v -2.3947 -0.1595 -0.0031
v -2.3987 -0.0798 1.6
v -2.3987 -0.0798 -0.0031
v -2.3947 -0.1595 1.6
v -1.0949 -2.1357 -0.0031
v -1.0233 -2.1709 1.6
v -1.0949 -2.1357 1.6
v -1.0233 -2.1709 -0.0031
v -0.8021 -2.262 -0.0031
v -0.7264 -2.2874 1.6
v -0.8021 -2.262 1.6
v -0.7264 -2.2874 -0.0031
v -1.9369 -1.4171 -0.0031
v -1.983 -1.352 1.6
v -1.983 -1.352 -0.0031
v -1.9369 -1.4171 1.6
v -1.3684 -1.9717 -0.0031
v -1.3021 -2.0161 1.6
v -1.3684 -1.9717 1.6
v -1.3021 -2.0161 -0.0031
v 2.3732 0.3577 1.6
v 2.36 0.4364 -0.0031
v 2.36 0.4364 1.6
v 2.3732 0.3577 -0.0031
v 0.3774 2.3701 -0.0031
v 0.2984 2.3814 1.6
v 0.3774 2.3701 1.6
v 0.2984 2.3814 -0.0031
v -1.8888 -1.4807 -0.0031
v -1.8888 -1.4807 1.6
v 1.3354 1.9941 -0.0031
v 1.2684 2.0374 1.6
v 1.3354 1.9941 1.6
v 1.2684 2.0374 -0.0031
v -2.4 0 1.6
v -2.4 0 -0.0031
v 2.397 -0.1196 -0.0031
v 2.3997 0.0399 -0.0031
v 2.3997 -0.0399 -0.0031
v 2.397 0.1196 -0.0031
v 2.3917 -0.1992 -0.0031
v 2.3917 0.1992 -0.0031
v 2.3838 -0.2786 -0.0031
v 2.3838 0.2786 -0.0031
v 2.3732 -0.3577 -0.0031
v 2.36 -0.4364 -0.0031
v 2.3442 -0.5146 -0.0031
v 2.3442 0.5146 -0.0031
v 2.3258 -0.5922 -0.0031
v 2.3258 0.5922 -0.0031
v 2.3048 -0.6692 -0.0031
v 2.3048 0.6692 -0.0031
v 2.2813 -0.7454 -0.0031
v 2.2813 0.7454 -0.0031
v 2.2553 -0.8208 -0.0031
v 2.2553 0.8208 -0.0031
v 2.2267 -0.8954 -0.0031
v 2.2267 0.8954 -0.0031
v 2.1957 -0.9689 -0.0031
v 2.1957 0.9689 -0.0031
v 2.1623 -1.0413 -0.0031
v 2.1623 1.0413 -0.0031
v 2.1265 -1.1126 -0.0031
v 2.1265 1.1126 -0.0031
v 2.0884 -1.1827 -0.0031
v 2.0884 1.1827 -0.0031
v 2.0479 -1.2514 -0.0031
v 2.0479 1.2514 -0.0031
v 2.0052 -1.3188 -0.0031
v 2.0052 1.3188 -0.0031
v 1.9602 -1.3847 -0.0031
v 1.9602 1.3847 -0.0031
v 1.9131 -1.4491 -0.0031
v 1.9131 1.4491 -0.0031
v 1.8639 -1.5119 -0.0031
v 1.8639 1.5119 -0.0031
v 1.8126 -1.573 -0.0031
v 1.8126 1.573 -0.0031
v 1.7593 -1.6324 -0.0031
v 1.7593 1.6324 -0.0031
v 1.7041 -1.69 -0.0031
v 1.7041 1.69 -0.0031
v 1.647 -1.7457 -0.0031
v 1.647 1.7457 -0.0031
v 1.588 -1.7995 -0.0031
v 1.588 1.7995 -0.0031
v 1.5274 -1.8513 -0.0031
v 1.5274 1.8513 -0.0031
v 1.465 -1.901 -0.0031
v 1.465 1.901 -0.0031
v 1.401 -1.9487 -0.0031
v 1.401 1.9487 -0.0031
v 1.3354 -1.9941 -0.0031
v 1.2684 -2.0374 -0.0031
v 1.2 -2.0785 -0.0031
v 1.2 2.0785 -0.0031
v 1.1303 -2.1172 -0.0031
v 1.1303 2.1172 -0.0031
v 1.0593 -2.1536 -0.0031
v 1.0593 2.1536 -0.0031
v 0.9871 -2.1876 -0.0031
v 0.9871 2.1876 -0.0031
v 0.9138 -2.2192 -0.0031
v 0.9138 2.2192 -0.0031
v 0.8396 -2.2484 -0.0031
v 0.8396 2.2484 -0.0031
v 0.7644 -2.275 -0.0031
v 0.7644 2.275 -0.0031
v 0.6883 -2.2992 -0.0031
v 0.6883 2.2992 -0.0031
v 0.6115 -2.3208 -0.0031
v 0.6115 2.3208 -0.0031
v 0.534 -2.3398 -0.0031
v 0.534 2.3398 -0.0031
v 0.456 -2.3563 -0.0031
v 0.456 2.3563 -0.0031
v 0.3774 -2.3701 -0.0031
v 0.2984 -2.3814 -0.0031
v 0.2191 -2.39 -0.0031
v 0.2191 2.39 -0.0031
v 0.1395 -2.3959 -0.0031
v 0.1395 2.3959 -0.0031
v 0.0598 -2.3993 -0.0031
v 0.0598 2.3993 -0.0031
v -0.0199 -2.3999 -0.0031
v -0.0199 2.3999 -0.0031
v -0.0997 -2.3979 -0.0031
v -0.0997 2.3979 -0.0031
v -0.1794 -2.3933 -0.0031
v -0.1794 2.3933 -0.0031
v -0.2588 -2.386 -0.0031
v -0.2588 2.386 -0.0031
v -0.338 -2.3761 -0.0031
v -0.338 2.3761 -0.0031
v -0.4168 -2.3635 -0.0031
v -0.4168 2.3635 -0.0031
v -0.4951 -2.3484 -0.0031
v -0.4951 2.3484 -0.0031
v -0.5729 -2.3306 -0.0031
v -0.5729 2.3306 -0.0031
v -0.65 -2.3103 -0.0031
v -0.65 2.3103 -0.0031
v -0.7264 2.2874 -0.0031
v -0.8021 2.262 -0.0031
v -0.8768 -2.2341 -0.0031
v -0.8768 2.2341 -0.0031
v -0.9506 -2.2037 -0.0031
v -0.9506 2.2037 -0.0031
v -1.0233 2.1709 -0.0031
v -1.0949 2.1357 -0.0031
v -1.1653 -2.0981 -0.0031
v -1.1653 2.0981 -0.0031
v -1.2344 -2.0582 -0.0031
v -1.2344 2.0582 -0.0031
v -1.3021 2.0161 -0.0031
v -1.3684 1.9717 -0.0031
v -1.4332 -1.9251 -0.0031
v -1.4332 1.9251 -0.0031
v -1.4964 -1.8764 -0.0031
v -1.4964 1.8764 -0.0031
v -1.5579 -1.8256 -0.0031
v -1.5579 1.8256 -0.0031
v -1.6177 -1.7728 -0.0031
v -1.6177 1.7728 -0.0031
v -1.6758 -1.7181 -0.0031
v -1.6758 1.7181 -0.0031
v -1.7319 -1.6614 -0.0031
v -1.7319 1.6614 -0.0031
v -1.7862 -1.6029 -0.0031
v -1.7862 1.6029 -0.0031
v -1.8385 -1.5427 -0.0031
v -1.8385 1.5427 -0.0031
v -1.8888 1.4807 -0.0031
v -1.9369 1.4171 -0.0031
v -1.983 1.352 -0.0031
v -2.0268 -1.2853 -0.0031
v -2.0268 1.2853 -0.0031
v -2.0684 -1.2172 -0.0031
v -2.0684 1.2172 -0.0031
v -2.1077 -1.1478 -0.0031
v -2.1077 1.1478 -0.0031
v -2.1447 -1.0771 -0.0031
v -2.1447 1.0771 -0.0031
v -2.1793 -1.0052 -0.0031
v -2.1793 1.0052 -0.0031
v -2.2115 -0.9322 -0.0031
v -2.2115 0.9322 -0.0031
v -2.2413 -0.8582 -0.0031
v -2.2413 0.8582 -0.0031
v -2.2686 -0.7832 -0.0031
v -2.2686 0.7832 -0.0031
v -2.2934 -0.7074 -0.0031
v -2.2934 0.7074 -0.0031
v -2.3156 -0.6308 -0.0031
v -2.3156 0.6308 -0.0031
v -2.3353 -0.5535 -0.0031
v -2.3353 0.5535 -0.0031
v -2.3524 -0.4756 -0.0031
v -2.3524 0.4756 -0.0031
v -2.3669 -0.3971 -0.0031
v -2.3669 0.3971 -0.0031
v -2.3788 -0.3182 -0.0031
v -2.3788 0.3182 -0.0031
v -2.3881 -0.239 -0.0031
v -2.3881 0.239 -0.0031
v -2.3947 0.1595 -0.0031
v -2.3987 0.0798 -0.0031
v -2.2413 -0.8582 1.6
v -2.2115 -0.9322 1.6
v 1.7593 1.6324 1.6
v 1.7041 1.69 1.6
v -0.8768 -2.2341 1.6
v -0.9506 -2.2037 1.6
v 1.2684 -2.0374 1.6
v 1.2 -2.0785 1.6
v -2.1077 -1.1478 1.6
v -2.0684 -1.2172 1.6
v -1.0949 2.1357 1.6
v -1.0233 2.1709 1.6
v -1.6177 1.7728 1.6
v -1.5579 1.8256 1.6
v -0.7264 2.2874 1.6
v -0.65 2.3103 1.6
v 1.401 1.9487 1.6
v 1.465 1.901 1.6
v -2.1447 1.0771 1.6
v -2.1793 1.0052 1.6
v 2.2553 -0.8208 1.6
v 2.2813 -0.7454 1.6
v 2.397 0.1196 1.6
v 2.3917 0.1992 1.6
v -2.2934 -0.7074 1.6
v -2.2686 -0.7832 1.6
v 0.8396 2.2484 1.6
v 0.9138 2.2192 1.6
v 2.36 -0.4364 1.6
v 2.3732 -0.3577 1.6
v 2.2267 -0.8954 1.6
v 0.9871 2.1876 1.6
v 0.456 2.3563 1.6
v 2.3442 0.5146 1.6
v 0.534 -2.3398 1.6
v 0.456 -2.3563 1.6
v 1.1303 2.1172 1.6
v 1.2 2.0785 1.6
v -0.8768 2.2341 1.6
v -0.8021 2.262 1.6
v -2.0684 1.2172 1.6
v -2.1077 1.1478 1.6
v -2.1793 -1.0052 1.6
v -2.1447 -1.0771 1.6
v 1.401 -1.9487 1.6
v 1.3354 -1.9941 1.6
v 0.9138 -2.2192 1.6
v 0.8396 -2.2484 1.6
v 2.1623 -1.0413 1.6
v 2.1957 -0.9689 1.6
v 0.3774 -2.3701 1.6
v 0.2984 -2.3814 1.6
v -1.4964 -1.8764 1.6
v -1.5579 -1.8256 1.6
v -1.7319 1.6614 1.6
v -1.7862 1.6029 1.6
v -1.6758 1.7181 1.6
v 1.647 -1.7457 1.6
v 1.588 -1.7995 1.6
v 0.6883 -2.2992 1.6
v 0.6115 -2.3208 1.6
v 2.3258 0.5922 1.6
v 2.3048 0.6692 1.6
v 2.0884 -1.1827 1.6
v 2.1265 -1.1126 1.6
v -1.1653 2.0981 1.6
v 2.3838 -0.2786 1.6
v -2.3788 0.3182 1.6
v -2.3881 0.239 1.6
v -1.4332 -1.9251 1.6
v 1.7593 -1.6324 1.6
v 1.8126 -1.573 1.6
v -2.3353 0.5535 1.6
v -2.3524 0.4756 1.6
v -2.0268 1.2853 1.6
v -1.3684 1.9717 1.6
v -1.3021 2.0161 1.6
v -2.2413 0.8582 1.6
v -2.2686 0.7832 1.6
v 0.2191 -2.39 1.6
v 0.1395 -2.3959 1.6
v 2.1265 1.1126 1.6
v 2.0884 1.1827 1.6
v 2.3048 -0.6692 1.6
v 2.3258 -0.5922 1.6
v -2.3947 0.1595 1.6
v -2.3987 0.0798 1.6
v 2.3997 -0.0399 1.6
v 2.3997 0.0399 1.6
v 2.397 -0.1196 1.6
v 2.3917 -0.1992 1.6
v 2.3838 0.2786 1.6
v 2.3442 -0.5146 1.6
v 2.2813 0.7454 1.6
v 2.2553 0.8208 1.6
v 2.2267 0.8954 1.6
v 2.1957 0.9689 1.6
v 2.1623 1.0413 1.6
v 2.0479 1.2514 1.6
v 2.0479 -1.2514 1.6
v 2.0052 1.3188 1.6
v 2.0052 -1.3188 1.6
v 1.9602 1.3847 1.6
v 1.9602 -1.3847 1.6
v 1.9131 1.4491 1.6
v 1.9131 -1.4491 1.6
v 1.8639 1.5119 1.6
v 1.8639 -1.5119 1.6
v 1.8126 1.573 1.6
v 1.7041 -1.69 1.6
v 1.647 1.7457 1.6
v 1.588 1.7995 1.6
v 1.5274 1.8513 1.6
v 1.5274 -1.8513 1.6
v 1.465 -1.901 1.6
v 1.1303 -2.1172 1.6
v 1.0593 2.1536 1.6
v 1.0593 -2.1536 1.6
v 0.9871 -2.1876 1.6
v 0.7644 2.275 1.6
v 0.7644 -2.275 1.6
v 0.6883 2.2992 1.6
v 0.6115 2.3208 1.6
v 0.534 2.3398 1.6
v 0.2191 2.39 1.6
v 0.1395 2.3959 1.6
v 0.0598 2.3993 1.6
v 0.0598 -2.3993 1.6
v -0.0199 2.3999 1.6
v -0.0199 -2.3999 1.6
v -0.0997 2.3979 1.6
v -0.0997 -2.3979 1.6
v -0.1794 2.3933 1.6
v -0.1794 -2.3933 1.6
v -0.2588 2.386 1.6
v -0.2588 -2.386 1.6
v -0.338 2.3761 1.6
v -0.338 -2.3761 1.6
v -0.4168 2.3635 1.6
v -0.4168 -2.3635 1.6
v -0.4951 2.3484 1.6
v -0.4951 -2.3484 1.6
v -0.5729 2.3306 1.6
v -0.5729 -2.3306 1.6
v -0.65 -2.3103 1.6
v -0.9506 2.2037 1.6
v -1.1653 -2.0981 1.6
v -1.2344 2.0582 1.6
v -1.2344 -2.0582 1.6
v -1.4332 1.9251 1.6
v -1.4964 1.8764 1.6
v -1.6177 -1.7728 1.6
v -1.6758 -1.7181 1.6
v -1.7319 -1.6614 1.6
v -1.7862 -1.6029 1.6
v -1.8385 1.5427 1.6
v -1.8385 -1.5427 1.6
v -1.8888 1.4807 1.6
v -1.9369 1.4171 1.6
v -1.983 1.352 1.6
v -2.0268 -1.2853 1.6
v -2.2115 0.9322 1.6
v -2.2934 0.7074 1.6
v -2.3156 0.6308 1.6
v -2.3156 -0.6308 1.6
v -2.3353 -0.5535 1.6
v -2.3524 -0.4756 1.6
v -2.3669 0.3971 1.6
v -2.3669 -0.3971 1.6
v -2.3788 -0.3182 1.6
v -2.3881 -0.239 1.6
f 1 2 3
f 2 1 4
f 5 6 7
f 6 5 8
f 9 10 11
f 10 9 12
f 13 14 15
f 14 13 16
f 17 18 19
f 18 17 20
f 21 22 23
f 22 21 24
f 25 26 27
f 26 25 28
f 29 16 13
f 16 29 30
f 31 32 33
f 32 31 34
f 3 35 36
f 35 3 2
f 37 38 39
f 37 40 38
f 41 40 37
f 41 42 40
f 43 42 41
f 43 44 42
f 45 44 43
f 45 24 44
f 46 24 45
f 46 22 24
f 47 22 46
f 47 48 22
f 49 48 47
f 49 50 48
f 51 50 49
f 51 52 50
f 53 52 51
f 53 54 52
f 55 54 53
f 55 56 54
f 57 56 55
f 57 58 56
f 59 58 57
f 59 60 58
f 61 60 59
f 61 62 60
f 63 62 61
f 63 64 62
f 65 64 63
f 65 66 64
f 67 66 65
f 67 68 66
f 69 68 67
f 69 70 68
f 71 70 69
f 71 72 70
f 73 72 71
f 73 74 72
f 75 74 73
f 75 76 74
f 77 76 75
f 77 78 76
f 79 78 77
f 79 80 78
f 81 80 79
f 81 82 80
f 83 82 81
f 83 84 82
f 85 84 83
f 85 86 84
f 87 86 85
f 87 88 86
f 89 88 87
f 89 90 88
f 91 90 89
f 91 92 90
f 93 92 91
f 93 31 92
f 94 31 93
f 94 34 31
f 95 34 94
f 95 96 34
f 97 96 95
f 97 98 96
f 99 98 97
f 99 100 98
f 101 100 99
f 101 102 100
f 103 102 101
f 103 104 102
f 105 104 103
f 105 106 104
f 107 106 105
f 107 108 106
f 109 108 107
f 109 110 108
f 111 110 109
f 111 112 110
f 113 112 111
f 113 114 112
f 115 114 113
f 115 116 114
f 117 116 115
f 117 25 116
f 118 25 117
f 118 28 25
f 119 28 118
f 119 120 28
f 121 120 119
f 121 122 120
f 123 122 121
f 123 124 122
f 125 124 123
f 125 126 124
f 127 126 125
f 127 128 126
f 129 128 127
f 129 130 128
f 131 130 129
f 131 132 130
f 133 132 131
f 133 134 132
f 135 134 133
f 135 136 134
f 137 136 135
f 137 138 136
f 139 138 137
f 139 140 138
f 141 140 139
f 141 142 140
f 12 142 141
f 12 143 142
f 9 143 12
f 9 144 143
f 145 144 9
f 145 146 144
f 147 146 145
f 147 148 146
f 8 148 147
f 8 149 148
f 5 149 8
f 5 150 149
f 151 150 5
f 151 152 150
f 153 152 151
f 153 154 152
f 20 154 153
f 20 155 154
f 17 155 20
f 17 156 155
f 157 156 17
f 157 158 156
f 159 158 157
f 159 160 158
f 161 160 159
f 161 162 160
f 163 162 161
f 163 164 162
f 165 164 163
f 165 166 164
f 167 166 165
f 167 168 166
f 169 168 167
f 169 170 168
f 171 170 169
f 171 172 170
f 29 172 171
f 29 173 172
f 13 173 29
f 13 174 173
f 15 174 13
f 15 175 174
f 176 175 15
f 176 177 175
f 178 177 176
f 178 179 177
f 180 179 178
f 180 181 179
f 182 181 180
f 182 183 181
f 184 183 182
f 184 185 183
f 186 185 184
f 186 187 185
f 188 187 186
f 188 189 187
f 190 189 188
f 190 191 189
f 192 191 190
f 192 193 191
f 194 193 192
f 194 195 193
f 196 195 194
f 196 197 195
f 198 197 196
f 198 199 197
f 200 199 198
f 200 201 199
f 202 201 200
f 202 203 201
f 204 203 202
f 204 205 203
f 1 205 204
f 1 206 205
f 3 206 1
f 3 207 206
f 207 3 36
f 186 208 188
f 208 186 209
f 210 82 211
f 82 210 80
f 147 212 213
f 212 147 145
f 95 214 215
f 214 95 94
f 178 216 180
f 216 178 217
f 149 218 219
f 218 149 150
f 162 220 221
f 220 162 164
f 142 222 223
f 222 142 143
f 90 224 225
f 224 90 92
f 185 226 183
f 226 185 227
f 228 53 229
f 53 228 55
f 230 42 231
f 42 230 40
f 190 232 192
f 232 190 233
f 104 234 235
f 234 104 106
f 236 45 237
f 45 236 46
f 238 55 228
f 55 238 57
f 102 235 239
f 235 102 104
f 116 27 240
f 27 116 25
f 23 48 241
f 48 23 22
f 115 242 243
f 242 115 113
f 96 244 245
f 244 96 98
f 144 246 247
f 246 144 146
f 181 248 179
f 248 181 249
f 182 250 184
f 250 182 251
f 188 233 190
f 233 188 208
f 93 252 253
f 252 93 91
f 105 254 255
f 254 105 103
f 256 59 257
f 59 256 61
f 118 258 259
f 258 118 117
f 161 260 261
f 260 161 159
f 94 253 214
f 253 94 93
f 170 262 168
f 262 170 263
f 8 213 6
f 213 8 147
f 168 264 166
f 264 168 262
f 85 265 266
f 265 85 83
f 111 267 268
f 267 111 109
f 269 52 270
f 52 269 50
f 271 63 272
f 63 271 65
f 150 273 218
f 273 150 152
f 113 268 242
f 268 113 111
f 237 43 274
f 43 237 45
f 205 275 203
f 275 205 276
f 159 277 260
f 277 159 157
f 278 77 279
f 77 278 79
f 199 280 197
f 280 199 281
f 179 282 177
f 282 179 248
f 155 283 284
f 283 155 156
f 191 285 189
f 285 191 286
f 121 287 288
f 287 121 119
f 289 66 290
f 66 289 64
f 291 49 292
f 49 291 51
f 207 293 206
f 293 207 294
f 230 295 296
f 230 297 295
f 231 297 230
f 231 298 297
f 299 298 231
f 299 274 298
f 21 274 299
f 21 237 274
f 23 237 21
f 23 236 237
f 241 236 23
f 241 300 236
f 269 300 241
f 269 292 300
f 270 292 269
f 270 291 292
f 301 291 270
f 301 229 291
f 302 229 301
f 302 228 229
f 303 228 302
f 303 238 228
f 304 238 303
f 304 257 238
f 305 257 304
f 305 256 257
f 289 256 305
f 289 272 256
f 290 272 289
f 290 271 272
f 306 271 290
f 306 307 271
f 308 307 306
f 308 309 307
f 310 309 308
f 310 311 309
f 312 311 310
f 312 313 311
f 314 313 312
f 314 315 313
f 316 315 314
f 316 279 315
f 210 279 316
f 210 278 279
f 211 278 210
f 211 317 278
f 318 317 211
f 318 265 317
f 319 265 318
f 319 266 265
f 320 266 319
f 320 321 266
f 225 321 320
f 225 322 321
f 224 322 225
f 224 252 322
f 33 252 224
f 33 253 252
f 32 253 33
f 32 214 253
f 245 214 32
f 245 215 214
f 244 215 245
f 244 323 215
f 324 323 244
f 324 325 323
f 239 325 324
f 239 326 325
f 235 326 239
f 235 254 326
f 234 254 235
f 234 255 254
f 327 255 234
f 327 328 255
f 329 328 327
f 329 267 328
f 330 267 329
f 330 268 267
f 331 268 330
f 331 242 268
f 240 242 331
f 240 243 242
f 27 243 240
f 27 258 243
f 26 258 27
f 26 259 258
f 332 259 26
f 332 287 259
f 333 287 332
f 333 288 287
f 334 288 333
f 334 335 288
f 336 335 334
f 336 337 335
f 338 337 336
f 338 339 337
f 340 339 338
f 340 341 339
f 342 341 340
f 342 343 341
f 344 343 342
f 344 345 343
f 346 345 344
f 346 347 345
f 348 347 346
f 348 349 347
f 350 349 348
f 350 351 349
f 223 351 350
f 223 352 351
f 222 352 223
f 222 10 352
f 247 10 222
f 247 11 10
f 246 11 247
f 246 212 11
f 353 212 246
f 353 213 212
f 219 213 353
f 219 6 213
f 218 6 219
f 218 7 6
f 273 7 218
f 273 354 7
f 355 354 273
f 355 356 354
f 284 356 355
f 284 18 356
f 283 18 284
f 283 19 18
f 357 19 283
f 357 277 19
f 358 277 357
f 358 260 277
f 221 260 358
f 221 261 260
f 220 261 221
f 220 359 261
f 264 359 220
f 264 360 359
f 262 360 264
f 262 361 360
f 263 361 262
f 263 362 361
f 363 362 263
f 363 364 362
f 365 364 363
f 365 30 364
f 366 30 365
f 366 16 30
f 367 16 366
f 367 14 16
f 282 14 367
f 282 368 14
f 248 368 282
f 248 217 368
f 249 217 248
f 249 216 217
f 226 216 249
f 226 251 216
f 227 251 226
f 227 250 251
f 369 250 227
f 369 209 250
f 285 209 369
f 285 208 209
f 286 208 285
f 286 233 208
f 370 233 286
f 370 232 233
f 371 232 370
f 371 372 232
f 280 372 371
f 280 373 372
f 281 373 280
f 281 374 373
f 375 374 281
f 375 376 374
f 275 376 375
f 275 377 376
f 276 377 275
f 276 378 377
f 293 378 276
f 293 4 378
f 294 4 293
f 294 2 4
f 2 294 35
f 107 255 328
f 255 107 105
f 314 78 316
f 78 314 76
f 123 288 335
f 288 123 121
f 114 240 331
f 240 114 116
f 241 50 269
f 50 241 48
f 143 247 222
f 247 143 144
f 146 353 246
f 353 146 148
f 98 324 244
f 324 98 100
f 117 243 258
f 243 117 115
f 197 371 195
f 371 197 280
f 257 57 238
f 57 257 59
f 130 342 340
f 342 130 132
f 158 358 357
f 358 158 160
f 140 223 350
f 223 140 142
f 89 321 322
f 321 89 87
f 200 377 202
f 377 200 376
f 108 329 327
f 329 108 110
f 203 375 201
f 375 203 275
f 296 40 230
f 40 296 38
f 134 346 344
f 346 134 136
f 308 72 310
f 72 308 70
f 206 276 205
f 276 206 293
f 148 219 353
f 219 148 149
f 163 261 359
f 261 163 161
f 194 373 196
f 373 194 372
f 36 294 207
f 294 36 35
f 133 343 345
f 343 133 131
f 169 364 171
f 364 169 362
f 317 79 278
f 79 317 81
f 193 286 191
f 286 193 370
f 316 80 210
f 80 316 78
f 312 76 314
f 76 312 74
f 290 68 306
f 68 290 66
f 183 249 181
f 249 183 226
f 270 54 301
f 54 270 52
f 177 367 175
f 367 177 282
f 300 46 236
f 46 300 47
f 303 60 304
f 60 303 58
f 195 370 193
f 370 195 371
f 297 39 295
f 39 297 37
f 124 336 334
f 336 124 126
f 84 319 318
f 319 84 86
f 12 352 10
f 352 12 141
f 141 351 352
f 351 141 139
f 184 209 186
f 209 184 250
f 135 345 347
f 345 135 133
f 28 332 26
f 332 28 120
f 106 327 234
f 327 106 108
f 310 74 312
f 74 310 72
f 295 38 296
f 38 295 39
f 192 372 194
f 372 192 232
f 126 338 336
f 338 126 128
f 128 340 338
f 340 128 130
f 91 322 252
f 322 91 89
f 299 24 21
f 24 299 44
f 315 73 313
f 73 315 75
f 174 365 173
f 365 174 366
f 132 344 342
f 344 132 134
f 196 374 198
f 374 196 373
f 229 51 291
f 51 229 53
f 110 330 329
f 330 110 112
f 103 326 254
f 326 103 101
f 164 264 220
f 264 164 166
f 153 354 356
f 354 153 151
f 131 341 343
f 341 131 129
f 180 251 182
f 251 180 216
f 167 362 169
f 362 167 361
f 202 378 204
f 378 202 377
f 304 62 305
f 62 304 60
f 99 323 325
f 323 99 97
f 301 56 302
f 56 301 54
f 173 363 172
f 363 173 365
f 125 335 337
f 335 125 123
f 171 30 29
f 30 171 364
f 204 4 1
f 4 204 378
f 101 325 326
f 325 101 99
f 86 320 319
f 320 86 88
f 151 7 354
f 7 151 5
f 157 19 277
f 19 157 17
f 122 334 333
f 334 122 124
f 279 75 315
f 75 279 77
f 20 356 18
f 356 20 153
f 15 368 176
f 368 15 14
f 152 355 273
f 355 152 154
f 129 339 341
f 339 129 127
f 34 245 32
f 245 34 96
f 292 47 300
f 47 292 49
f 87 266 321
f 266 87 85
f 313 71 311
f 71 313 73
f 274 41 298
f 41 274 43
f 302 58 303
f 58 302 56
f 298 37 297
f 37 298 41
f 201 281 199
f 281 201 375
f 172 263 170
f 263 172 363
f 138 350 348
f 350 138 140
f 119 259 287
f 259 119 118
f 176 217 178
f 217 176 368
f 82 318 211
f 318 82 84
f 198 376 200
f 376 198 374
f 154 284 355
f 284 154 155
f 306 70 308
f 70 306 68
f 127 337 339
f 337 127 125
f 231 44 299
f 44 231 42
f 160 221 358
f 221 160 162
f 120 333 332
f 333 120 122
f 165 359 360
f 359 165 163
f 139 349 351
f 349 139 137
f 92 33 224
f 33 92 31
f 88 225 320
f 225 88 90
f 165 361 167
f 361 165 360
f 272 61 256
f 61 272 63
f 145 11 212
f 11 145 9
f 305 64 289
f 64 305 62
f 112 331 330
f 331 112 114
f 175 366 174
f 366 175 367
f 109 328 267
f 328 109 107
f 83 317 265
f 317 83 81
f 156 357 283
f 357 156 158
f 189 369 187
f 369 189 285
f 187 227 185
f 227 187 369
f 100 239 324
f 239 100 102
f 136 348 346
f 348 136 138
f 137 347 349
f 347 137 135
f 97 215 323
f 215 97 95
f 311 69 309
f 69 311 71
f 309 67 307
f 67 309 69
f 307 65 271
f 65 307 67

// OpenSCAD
// file: ../p/stud3.scad
use <../lib.scad>
use <4-4cyli.scad>
use <4-4disc.scad>
use <4-4edge.scad>
$fa=1; $fs=0.2;
function ldraw_lib__stud3(realsolid=false) = realsolid ? 
    [openscad(translate([0,0,-eps()], o=cylinder(4+eps(), r=4)),2)] : [
// 0 Stud Tube Solid
// 0 Name: stud3.dat
// 0 Author: James Jessiman
// 0 !LDRAW_ORG Primitive UPDATE 2012-01
// 0 !LICENSE Licensed under CC BY 2.0 and CC BY 4.0 : see CAreadme.txt
// 
// 0 BFC CERTIFY CCW
  [0,"BFC","CERTIFY"],
  [0,"BFC","CCW"],
// 
// 0 !HISTORY 2002-04-04 [sbliss] Modified for BFC compliance
// 0 !HISTORY 2002-04-25 [PTadmin] Official Update 2002-02
// 0 !HISTORY 2007-06-24 [PTadmin] Header formatted for Contributor Agreement
// 0 !HISTORY 2008-07-01 [PTadmin] Official Update 2008-01
// 0 !HISTORY 2012-02-16 [Philo] Changed to CCW
// 0 !HISTORY 2012-03-30 [PTadmin] Official Update 2012-01
// 
// 
// 1 16 0 -4 0 4 0 0 0 1 0 0 0 4 4-4edge.dat
  [1,16,0,-4,0,4,0,0,0,1,0,0,0,4, ldraw_lib__4_4edge(realsolid)],
// 1 16 0 0 0 4 0 0 0 1 0 0 0 4 4-4edge.dat
  [1,16,0,0,0,4,0,0,0,1,0,0,0,4, ldraw_lib__4_4edge(realsolid)],
// 1 16 0 -4 0 4 0 0 0 1 0 0 0 4 4-4disc.dat
  [1,16,0,-4,0,4,0,0,0,1,0,0,0,4, ldraw_lib__4_4disc(realsolid)],
// 1 16 0 -4 0 4 0 0 0 4 0 0 0 4 4-4cyli.dat
  [1,16,0,-4,0,4,0,0,0,4,0,0,0,4, ldraw_lib__4_4cyli(realsolid)],
];
module ldraw_lib__stud3(step=0, col=false, unit=2/5, alt=false, line=0.2, solid=!$preview)
    makepoly(ldraw_lib__stud3(solid), step=step, col=col, unit=unit, alt=alt, line=line, solid=solid);
ldraw_lib__stud3(line=0.2);
// file: ../p/4-4edge.scad
use <../lib.scad>
$fa=1; $fs=0.2;
function ldraw_lib__4_4edge(realsolid=false) = [
// 0 Circle 1.0
// 0 Name: 4-4edge.dat
// 0 Author: James Jessiman
// 0 !LDRAW_ORG Primitive UPDATE 2017-01
// 0 !LICENSE Licensed under CC BY 2.0 and CC BY 4.0 : see CAreadme.txt
// 
// 0 BFC CERTIFY CCW
  [0,"BFC","CERTIFY"],
  [0,"BFC","CCW"],
// 
// 0 !HISTORY 1998-12-15 [PTadmin] Official Update 1998-10
// 0 !HISTORY 2005-12-28 [PTadmin] Official Update 2005-01
// 0 !HISTORY 2007-06-24 [PTadmin] Header formatted for Contributor Agreement
// 0 !HISTORY 2008-07-01 [PTadmin] Official Update 2008-01
// 0 !HISTORY 2017-01-15 [Steffen] BFCed
// 0 !HISTORY 2017-12-30 [PTadmin] Official Update 2017-01
// 
// 
// 2 24 1 0 0 0.9239 0 0.3827
  [2,24,1,0,0,0.9239,0,0.3827],
// 2 24 0.9239 0 0.3827 0.7071 0 0.7071
  [2,24,0.9239,0,0.3827,0.7071,0,0.7071],
// 2 24 0.7071 0 0.7071 0.3827 0 0.9239
  [2,24,0.7071,0,0.7071,0.3827,0,0.9239],
// 2 24 0.3827 0 0.9239 0 0 1
  [2,24,0.3827,0,0.9239,0,0,1],
// 2 24 0 0 1 -0.3827 0 0.9239
  [2,24,0,0,1,-0.3827,0,0.9239],
// 2 24 -0.3827 0 0.9239 -0.7071 0 0.7071
  [2,24,-0.3827,0,0.9239,-0.7071,0,0.7071],
// 2 24 -0.7071 0 0.7071 -0.9239 0 0.3827
  [2,24,-0.7071,0,0.7071,-0.9239,0,0.3827],
// 2 24 -0.9239 0 0.3827 -1 0 -0
  [2,24,-0.9239,0,0.3827,-1,0,-0],
// 2 24 -1 0 -0 -0.9239 0 -0.3827
  [2,24,-1,0,-0,-0.9239,0,-0.3827],
// 2 24 -0.9239 0 -0.3827 -0.7071 0 -0.7071
  [2,24,-0.9239,0,-0.3827,-0.7071,0,-0.7071],
// 2 24 -0.7071 0 -0.7071 -0.3827 0 -0.9239
  [2,24,-0.7071,0,-0.7071,-0.3827,0,-0.9239],
// 2 24 -0.3827 0 -0.9239 0 0 -1
  [2,24,-0.3827,0,-0.9239,0,0,-1],
// 2 24 0 0 -1 0.3827 0 -0.9239
  [2,24,0,0,-1,0.3827,0,-0.9239],
// 2 24 0.3827 0 -0.9239 0.7071 0 -0.7071
  [2,24,0.3827,0,-0.9239,0.7071,0,-0.7071],
// 2 24 0.7071 0 -0.7071 0.9239 0 -0.3827
  [2,24,0.7071,0,-0.7071,0.9239,0,-0.3827],
// 2 24 0.9239 0 -0.3827 1 0 0
  [2,24,0.9239,0,-0.3827,1,0,0],
];
module ldraw_lib__4_4edge(step=0, col=false, unit=2/5, alt=false, line=0.2, solid=!$preview)
    makepoly(ldraw_lib__4_4edge(solid), step=step, col=col, unit=unit, alt=alt, line=line, solid=solid);
ldraw_lib__4_4edge(line=0.2);
// file: ../p/4-4disc.scad
use <../lib.scad>
$fa=1; $fs=0.2;
function ldraw_lib__4_4disc(realsolid=false) = [
// 0 Disc 1.0
// 0 Name: 4-4disc.dat
// 0 Author: James Jessiman
// 0 !LDRAW_ORG Primitive UPDATE 2002-02
// 0 !LICENSE Licensed under CC BY 2.0 and CC BY 4.0 : see CAreadme.txt
// 
// 0 BFC CERTIFY CCW
  [0,"BFC","CERTIFY"],
  [0,"BFC","CCW"],
// 
// 0 !HISTORY 1998-12-15 [PTadmin] Official Update 1998-10
// 0 !HISTORY 2002-03-23 [sbliss] Added BFC statement
// 0 !HISTORY 2002-04-25 [PTadmin] Official Update 2002-02
// 0 !HISTORY 2007-06-24 [PTadmin] Header formatted for Contributor Agreement
// 0 !HISTORY 2008-07-01 [PTadmin] Official Update 2008-01
// 
// 
// 3 16 0 0 0 1 0 0 0.9239 0 0.3827
  [3,16,0,0,0,1,0,0,0.9239,0,0.3827],
// 3 16 0 0 0 0.9239 0 0.3827 0.7071 0 0.7071
  [3,16,0,0,0,0.9239,0,0.3827,0.7071,0,0.7071],
// 3 16 0 0 0 0.7071 0 0.7071 0.3827 0 0.9239
  [3,16,0,0,0,0.7071,0,0.7071,0.3827,0,0.9239],
// 3 16 0 0 0 0.3827 0 0.9239 0 0 1
  [3,16,0,0,0,0.3827,0,0.9239,0,0,1],
// 3 16 0 0 0 0 0 1 -0.3827 0 0.9239
  [3,16,0,0,0,0,0,1,-0.3827,0,0.9239],
// 3 16 0 0 0 -0.3827 0 0.9239 -0.7071 0 0.7071
  [3,16,0,0,0,-0.3827,0,0.9239,-0.7071,0,0.7071],
// 3 16 0 0 0 -0.7071 0 0.7071 -0.9239 0 0.3827
  [3,16,0,0,0,-0.7071,0,0.7071,-0.9239,0,0.3827],
// 3 16 0 0 0 -0.9239 0 0.3827 -1 0 -0
  [3,16,0,0,0,-0.9239,0,0.3827,-1,0,-0],
// 3 16 0 0 0 -1 0 -0 -0.9239 0 -0.3827
  [3,16,0,0,0,-1,0,-0,-0.9239,0,-0.3827],
// 3 16 0 0 0 -0.9239 0 -0.3827 -0.7071 0 -0.7071
  [3,16,0,0,0,-0.9239,0,-0.3827,-0.7071,0,-0.7071],
// 3 16 0 0 0 -0.7071 0 -0.7071 -0.3827 0 -0.9239
  [3,16,0,0,0,-0.7071,0,-0.7071,-0.3827,0,-0.9239],
// 3 16 0 0 0 -0.3827 0 -0.9239 0 0 -1
  [3,16,0,0,0,-0.3827,0,-0.9239,0,0,-1],
// 3 16 0 0 0 0 0 -1 0.3827 0 -0.9239
  [3,16,0,0,0,0,0,-1,0.3827,0,-0.9239],
// 3 16 0 0 0 0.3827 0 -0.9239 0.7071 0 -0.7071
  [3,16,0,0,0,0.3827,0,-0.9239,0.7071,0,-0.7071],
// 3 16 0 0 0 0.7071 0 -0.7071 0.9239 0 -0.3827
  [3,16,0,0,0,0.7071,0,-0.7071,0.9239,0,-0.3827],
// 3 16 0 0 0 0.9239 0 -0.3827 1 0 0
  [3,16,0,0,0,0.9239,0,-0.3827,1,0,0],
// 0
];
module ldraw_lib__4_4disc(step=0, col=false, unit=2/5, alt=false, line=0.2, solid=!$preview)
    makepoly(ldraw_lib__4_4disc(solid), step=step, col=col, unit=unit, alt=alt, line=line, solid=solid);
ldraw_lib__4_4disc(line=0.2);
// file: ../p/4-4cyli.scad
use <../lib.scad>
$fa=1; $fs=0.2;
function ldraw_lib__4_4cyli(realsolid=false) = [
// 0 Cylinder 1.0
// 0 Name: 4-4cyli.dat
// 0 Author: James Jessiman
// 0 !LDRAW_ORG Primitive UPDATE 2005-01
// 0 !LICENSE Licensed under CC BY 2.0 and CC BY 4.0 : see CAreadme.txt
// 
// 0 BFC CERTIFY CCW
  [0,"BFC","CERTIFY"],
  [0,"BFC","CCW"],
// 
// 0 !HISTORY 1998-12-15 [PTadmin] Official Update 1998-10
// 0 !HISTORY 2002-03-23 [sbliss] Added BFC statement; merged headers from files in distributions LDraw 0.27 and Complete.
// 0 !HISTORY 2002-04-25 [PTadmin] Official Update 2002-02
// 0 !HISTORY 2004-12-14 [guyvivan] BFC CCW
// 0 !HISTORY 2005-12-28 [PTadmin] Official Update 2005-01
// 0 !HISTORY 2007-06-24 [PTadmin] Header formatted for Contributor Agreement
// 0 !HISTORY 2008-07-01 [PTadmin] Official Update 2008-01
// 
// 
// 4 16 1 1 0 0.9239 1 0.3827 0.9239 0 0.3827 1 0 0
  [4,16,1,1,0,0.9239,1,0.3827,0.9239,0,0.3827,1,0,0],
// 5 24 1 0 0 1 1 0 0.9239 0 0.3827 0.9239 0 -0.3827
  [5,24,1,0,0,1,1,0,0.9239,0,0.3827,0.9239,0,-0.3827],
// 4 16 0.9239 1 0.3827 0.7071 1 0.7071 0.7071 0 0.7071 0.9239 0 0.3827
  [4,16,0.9239,1,0.3827,0.7071,1,0.7071,0.7071,0,0.7071,0.9239,0,0.3827],
// 5 24 0.9239 0 0.3827 0.9239 1 0.3827 0.7071 0 0.7071 1 0 0
  [5,24,0.9239,0,0.3827,0.9239,1,0.3827,0.7071,0,0.7071,1,0,0],
// 4 16 0.7071 1 0.7071 0.3827 1 0.9239 0.3827 0 0.9239 0.7071 0 0.7071
  [4,16,0.7071,1,0.7071,0.3827,1,0.9239,0.3827,0,0.9239,0.7071,0,0.7071],
// 5 24 0.7071 0 0.7071 0.7071 1 0.7071 0.3827 0 0.9239 0.9239 0 0.3827
  [5,24,0.7071,0,0.7071,0.7071,1,0.7071,0.3827,0,0.9239,0.9239,0,0.3827],
// 4 16 0.3827 1 0.9239 0 1 1 0 0 1 0.3827 0 0.9239
  [4,16,0.3827,1,0.9239,0,1,1,0,0,1,0.3827,0,0.9239],
// 5 24 0.3827 0 0.9239 0.3827 1 0.9239 0 0 1 0.7071 0 0.7071
  [5,24,0.3827,0,0.9239,0.3827,1,0.9239,0,0,1,0.7071,0,0.7071],
// 4 16 0 1 1 -0.3827 1 0.9239 -0.3827 0 0.9239 0 0 1
  [4,16,0,1,1,-0.3827,1,0.9239,-0.3827,0,0.9239,0,0,1],
// 5 24 0 0 1 0 1 1 -0.3827 0 0.9239 0.3827 0 0.9239
  [5,24,0,0,1,0,1,1,-0.3827,0,0.9239,0.3827,0,0.9239],
// 4 16 -0.3827 1 0.9239 -0.7071 1 0.7071 -0.7071 0 0.7071 -0.3827 0 0.9239
  [4,16,-0.3827,1,0.9239,-0.7071,1,0.7071,-0.7071,0,0.7071,-0.3827,0,0.9239],
// 5 24 -0.3827 0 0.9239 -0.3827 1 0.9239 -0.7071 0 0.7071 0 0 1
  [5,24,-0.3827,0,0.9239,-0.3827,1,0.9239,-0.7071,0,0.7071,0,0,1],
// 4 16 -0.7071 1 0.7071 -0.9239 1 0.3827 -0.9239 0 0.3827 -0.7071 0 0.7071
  [4,16,-0.7071,1,0.7071,-0.9239,1,0.3827,-0.9239,0,0.3827,-0.7071,0,0.7071],
// 5 24 -0.7071 0 0.7071 -0.7071 1 0.7071 -0.9239 0 0.3827 -0.3827 0 0.9239
  [5,24,-0.7071,0,0.7071,-0.7071,1,0.7071,-0.9239,0,0.3827,-0.3827,0,0.9239],
// 4 16 -0.9239 1 0.3827 -1 1 0 -1 0 0 -0.9239 0 0.3827
  [4,16,-0.9239,1,0.3827,-1,1,0,-1,0,0,-0.9239,0,0.3827],
// 5 24 -0.9239 0 0.3827 -0.9239 1 0.3827 -1 0 0 -0.7071 0 0.7071
  [5,24,-0.9239,0,0.3827,-0.9239,1,0.3827,-1,0,0,-0.7071,0,0.7071],
// 4 16 -1 1 0 -0.9239 1 -0.3827 -0.9239 0 -0.3827 -1 0 0
  [4,16,-1,1,0,-0.9239,1,-0.3827,-0.9239,0,-0.3827,-1,0,0],
// 5 24 -1 0 0 -1 1 0 -0.9239 0 -0.3827 -0.9239 0 0.3827
  [5,24,-1,0,0,-1,1,0,-0.9239,0,-0.3827,-0.9239,0,0.3827],
// 4 16 -0.9239 1 -0.3827 -0.7071 1 -0.7071 -0.7071 0 -0.7071 -0.9239 0 -0.3827
  [4,16,-0.9239,1,-0.3827,-0.7071,1,-0.7071,-0.7071,0,-0.7071,-0.9239,0,-0.3827],
// 5 24 -0.9239 0 -0.3827 -0.9239 1 -0.3827 -0.7071 0 -0.7071 -1 0 0
  [5,24,-0.9239,0,-0.3827,-0.9239,1,-0.3827,-0.7071,0,-0.7071,-1,0,0],
// 4 16 -0.7071 1 -0.7071 -0.3827 1 -0.9239 -0.3827 0 -0.9239 -0.7071 0 -0.7071
  [4,16,-0.7071,1,-0.7071,-0.3827,1,-0.9239,-0.3827,0,-0.9239,-0.7071,0,-0.7071],
// 5 24 -0.7071 0 -0.7071 -0.7071 1 -0.7071 -0.3827 0 -0.9239 -0.9239 0 -0.3827
  [5,24,-0.7071,0,-0.7071,-0.7071,1,-0.7071,-0.3827,0,-0.9239,-0.9239,0,-0.3827],
// 4 16 -0.3827 1 -0.9239 0 1 -1 0 0 -1 -0.3827 0 -0.9239
  [4,16,-0.3827,1,-0.9239,0,1,-1,0,0,-1,-0.3827,0,-0.9239],
// 5 24 -0.3827 0 -0.9239 -0.3827 1 -0.9239 0 0 -1 -0.7071 0 -0.7071
  [5,24,-0.3827,0,-0.9239,-0.3827,1,-0.9239,0,0,-1,-0.7071,0,-0.7071],
// 4 16 0 1 -1 0.3827 1 -0.9239 0.3827 0 -0.9239 0 0 -1
  [4,16,0,1,-1,0.3827,1,-0.9239,0.3827,0,-0.9239,0,0,-1],
// 5 24 0 0 -1 0 1 -1 0.3827 0 -0.9239 -0.3827 0 -0.9239
  [5,24,0,0,-1,0,1,-1,0.3827,0,-0.9239,-0.3827,0,-0.9239],
// 4 16 0.3827 1 -0.9239 0.7071 1 -0.7071 0.7071 0 -0.7071 0.3827 0 -0.9239
  [4,16,0.3827,1,-0.9239,0.7071,1,-0.7071,0.7071,0,-0.7071,0.3827,0,-0.9239],
// 5 24 0.3827 0 -0.9239 0.3827 1 -0.9239 0.7071 0 -0.7071 0 0 -1
  [5,24,0.3827,0,-0.9239,0.3827,1,-0.9239,0.7071,0,-0.7071,0,0,-1],
// 4 16 0.7071 1 -0.7071 0.9239 1 -0.3827 0.9239 0 -0.3827 0.7071 0 -0.7071
  [4,16,0.7071,1,-0.7071,0.9239,1,-0.3827,0.9239,0,-0.3827,0.7071,0,-0.7071],
// 5 24 0.7071 0 -0.7071 0.7071 1 -0.7071 0.9239 0 -0.3827 0.3827 0 -0.9239
  [5,24,0.7071,0,-0.7071,0.7071,1,-0.7071,0.9239,0,-0.3827,0.3827,0,-0.9239],
// 4 16 0.9239 1 -0.3827 1 1 0 1 0 0 0.9239 0 -0.3827
  [4,16,0.9239,1,-0.3827,1,1,0,1,0,0,0.9239,0,-0.3827],
// 5 24 0.9239 0 -0.3827 0.9239 1 -0.3827 1 0 0 0.7071 0 -0.7071
  [5,24,0.9239,0,-0.3827,0.9239,1,-0.3827,1,0,0,0.7071,0,-0.7071],
// 0
];
module ldraw_lib__4_4cyli(step=0, col=false, unit=2/5, alt=false, line=0.2, solid=!$preview)
    makepoly(ldraw_lib__4_4cyli(solid), step=step, col=col, unit=unit, alt=alt, line=line, solid=solid);
ldraw_lib__4_4cyli(line=0.2);
// file: s/3004s01.scad
use <../../lib.scad>
use <../../p/box4t.scad>
use <../../p/box5.scad>
use <../../p/stud.scad>
use <../../p/stud3.scad>
$fa=1; $fs=0.2;
function ldraw_lib__s__3004s01(realsolid=false) = [
// 0 ~Brick  1 x  2 without Front Face
// 0 Name: s\3004s01.dat
// 0 Author: James Jessiman
// 0 !LDRAW_ORG Subpart UPDATE 2003-03
// 0 !LICENSE Licensed under CC BY 2.0 and CC BY 4.0 : see CAreadme.txt
// 
// 0 BFC CERTIFY CCW
  [0,"BFC","CERTIFY"],
  [0,"BFC","CCW"],
// 
// 0 !HISTORY 2003-09-07 [jriley] Subfiling, BFC
// 0 !HISTORY 2003-12-19 [PTadmin] Official Update 2003-03
// 0 !HISTORY 2007-08-29 [PTadmin] Header formatted for Contributor Agreement
// 0 !HISTORY 2008-07-01 [PTadmin] Official Update 2008-01
// 
// 
// 1 16 0 4 0 1 0 0 0 -5 0 0 0 1 stud3.dat
  [1,16,0,4,0,1,0,0,0,-5,0,0,0,1, ldraw_lib__stud3(realsolid)],
// 0 BFC INVERTNEXT
  [0,"BFC","INVERTNEXT"],
// 1 16 0 24 0 16 0 0 0 -20 0 0 0 6 box5.dat
  [1,16,0,24,0,16,0,0,0,-20,0,0,0,6, ldraw_lib__box5(realsolid)],
// 4 16 20 24 10 16 24 6 -16 24 6 -20 24 10
  [4,16,20,24,10,16,24,6,-16,24,6,-20,24,10],
// 4 16 -20 24 10 -16 24 6 -16 24 -6 -20 24 -10
  [4,16,-20,24,10,-16,24,6,-16,24,-6,-20,24,-10],
// 4 16 -20 24 -10 -16 24 -6 16 24 -6 20 24 -10
  [4,16,-20,24,-10,-16,24,-6,16,24,-6,20,24,-10],
// 4 16 20 24 -10 16 24 -6 16 24 6 20 24 10
  [4,16,20,24,-10,16,24,-6,16,24,6,20,24,10],
// 1 16 0 24 0 20 0 0 0 -24 0 0 0 10 box4t.dat
  [1,16,0,24,0,20,0,0,0,-24,0,0,0,10, ldraw_lib__box4t(realsolid)],
// 1 16 10 0 0 1 0 0 0 1 0 0 0 1 stud.dat
  [1,16,10,0,0,1,0,0,0,1,0,0,0,1, ldraw_lib__stud(realsolid)],
// 1 16 -10 0 0 1 0 0 0 1 0 0 0 1 stud.dat
  [1,16,-10,0,0,1,0,0,0,1,0,0,0,1, ldraw_lib__stud(realsolid)],
// 0
];
module ldraw_lib__s__3004s01(step=0, col=false, unit=2/5, alt=false, line=0.2, solid=!$preview)
    makepoly(ldraw_lib__s__3004s01(solid), step=step, col=col, unit=unit, alt=alt, line=line, solid=solid);
ldraw_lib__s__3004s01(line=0.2);
// file: ../p/stud.scad
use <../lib.scad>
use <4-4cyli.scad>
use <4-4disc.scad>
use <4-4edge.scad>
$fa=1; $fs=0.2;
function ldraw_lib__stud(realsolid=false) = realsolid ? 
    [openscad(translate([0,0,-eps()], o=cylinder(4+eps(), r=6)),2)] : [
// 0 Stud
// 0 Name: stud.dat
// 0 Author: James Jessiman
// 0 !LDRAW_ORG Primitive UPDATE 2012-01
// 0 !LICENSE Licensed under CC BY 2.0 and CC BY 4.0 : see CAreadme.txt
// 
// 0 BFC CERTIFY CCW
  [0,"BFC","CERTIFY"],
  [0,"BFC","CCW"],
// 
// 0 !HISTORY 2002-04-04 [sbliss] Modified for BFC compliance
// 0 !HISTORY 2002-04-25 [PTadmin] Official Update 2002-02
// 0 !HISTORY 2007-06-24 [PTadmin] Header formatted for Contributor Agreement
// 0 !HISTORY 2008-07-01 [PTadmin] Official Update 2008-01
// 0 !HISTORY 2012-02-16 [Philo] Changed to CCW
// 0 !HISTORY 2012-03-30 [PTadmin] Official Update 2012-01
// 
// 
// 1 16 0 0 0 6 0 0 0 1 0 0 0 6 4-4edge.dat
  [1,16,0,0,0,6,0,0,0,1,0,0,0,6, ldraw_lib__4_4edge(realsolid)],
// 1 16 0 -4 0 6 0 0 0 1 0 0 0 6 4-4edge.dat
  [1,16,0,-4,0,6,0,0,0,1,0,0,0,6, ldraw_lib__4_4edge(realsolid)],
// 1 16 0 0 0 6 0 0 0 -4 0 0 0 6 4-4cyli.dat
  [1,16,0,0,0,6,0,0,0,-4,0,0,0,6, ldraw_lib__4_4cyli(realsolid)],
// 1 16 0 -4 0 6 0 0 0 1 0 0 0 6 4-4disc.dat
  [1,16,0,-4,0,6,0,0,0,1,0,0,0,6, ldraw_lib__4_4disc(realsolid)],
];
module ldraw_lib__stud(step=0, col=false, unit=2/5, alt=false, line=0.2, solid=!$preview)
    makepoly(ldraw_lib__stud(solid), step=step, col=col, unit=unit, alt=alt, line=line, solid=solid);
ldraw_lib__stud(line=0.2);
// file: ../p/box5.scad
use <../lib.scad>
$fa=1; $fs=0.2;
function ldraw_lib__box5(realsolid=false) = [
// 0 Box with 5 Faces and All Edges
// 0 Name: box5.dat
// 0 Author: James Jessiman
// 0 !LDRAW_ORG Primitive UPDATE 2012-01
// 0 !LICENSE Licensed under CC BY 2.0 and CC BY 4.0 : see CAreadme.txt
// 
// 0 BFC CERTIFY CCW
  [0,"BFC","CERTIFY"],
  [0,"BFC","CCW"],
// 
// 0 !HISTORY 2002-04-03 [sbliss] Modified for BFC compliance
// 0 !HISTORY 2002-04-25 [PTadmin] Official Update 2002-02
// 0 !HISTORY 2007-06-24 [PTadmin] Header formatted for Contributor Agreement
// 0 !HISTORY 2008-07-01 [PTadmin] Official Update 2008-01
// 0 !HISTORY 2012-02-16 [Philo] Changed to CCW
// 0 !HISTORY 2012-03-30 [PTadmin] Official Update 2012-01
// 
// 
// 2 24 1 1 1 -1 1 1
  [2,24,1,1,1,-1,1,1],
// 2 24 -1 1 1 -1 1 -1
  [2,24,-1,1,1,-1,1,-1],
// 2 24 -1 1 -1 1 1 -1
  [2,24,-1,1,-1,1,1,-1],
// 2 24 1 1 -1 1 1 1
  [2,24,1,1,-1,1,1,1],
// 2 24 1 0 1 -1 0 1
  [2,24,1,0,1,-1,0,1],
// 2 24 -1 0 1 -1 0 -1
  [2,24,-1,0,1,-1,0,-1],
// 2 24 -1 0 -1 1 0 -1
  [2,24,-1,0,-1,1,0,-1],
// 2 24 1 0 -1 1 0 1
  [2,24,1,0,-1,1,0,1],
// 2 24 1 0 1 1 1 1
  [2,24,1,0,1,1,1,1],
// 2 24 -1 0 1 -1 1 1
  [2,24,-1,0,1,-1,1,1],
// 2 24 1 0 -1 1 1 -1
  [2,24,1,0,-1,1,1,-1],
// 2 24 -1 0 -1 -1 1 -1
  [2,24,-1,0,-1,-1,1,-1],
// 4 16 -1 1 1 1 1 1 1 1 -1 -1 1 -1
  [4,16,-1,1,1,1,1,1,1,1,-1,-1,1,-1],
// 4 16 -1 1 1 -1 0 1 1 0 1 1 1 1
  [4,16,-1,1,1,-1,0,1,1,0,1,1,1,1],
// 4 16 -1 1 -1 -1 0 -1 -1 0 1 -1 1 1
  [4,16,-1,1,-1,-1,0,-1,-1,0,1,-1,1,1],
// 4 16 1 1 -1 1 0 -1 -1 0 -1 -1 1 -1
  [4,16,1,1,-1,1,0,-1,-1,0,-1,-1,1,-1],
// 4 16 1 1 1 1 0 1 1 0 -1 1 1 -1
  [4,16,1,1,1,1,0,1,1,0,-1,1,1,-1],
];
module ldraw_lib__box5(step=0, col=false, unit=2/5, alt=false, line=0.2, solid=!$preview)
    makepoly(ldraw_lib__box5(solid), step=step, col=col, unit=unit, alt=alt, line=line, solid=solid);
ldraw_lib__box5(line=0.2);
// file: ../p/box4t.scad
use <../lib.scad>
$fa=1; $fs=0.2;
function ldraw_lib__box4t(realsolid=false) = [
// 0 Box with 4 Adjacent Faces and All Edges
// 0 Name: box4t.dat
// 0 Author: Tore Eriksson [Tore_Eriksson]
// 0 !LDRAW_ORG Primitive UPDATE 2003-02
// 0 !LICENSE Licensed under CC BY 2.0 and CC BY 4.0 : see CAreadme.txt
// 
// 0 BFC CERTIFY CCW
  [0,"BFC","CERTIFY"],
  [0,"BFC","CCW"],
// 
// 0 !HISTORY 1997-09-29 [PTadmin] Official Update 1997-15
// 0 !HISTORY 2002-08-31 [izanette] Modified with WINDZ for BFC compliance
// 0 !HISTORY 2003-08-01 [PTadmin] Official Update 2003-02
// 0 !HISTORY 2007-06-24 [PTadmin] Header formatted for Contributor Agreement
// 0 !HISTORY 2008-07-01 [PTadmin] Official Update 2008-01
// 
// 
// 2 24 1 1 1 -1 1 1
  [2,24,1,1,1,-1,1,1],
// 2 24 -1 1 1 -1 1 -1
  [2,24,-1,1,1,-1,1,-1],
// 2 24 -1 1 -1 1 1 -1
  [2,24,-1,1,-1,1,1,-1],
// 2 24 1 1 -1 1 1 1
  [2,24,1,1,-1,1,1,1],
// 2 24 1 0 1 -1 0 1
  [2,24,1,0,1,-1,0,1],
// 2 24 -1 0 1 -1 0 -1
  [2,24,-1,0,1,-1,0,-1],
// 2 24 -1 0 -1 1 0 -1
  [2,24,-1,0,-1,1,0,-1],
// 2 24 1 0 -1 1 0 1
  [2,24,1,0,-1,1,0,1],
// 2 24 1 0 1 1 1 1
  [2,24,1,0,1,1,1,1],
// 2 24 -1 0 1 -1 1 1
  [2,24,-1,0,1,-1,1,1],
// 2 24 1 0 -1 1 1 -1
  [2,24,1,0,-1,1,1,-1],
// 2 24 -1 0 -1 -1 1 -1
  [2,24,-1,0,-1,-1,1,-1],
// 4 16 1 1 1 1 1 -1 -1 1 -1 -1 1 1
  [4,16,1,1,1,1,1,-1,-1,1,-1,-1,1,1],
// 4 16 1 1 1 -1 1 1 -1 0 1 1 0 1
  [4,16,1,1,1,-1,1,1,-1,0,1,1,0,1],
// 4 16 -1 1 1 -1 1 -1 -1 0 -1 -1 0 1
  [4,16,-1,1,1,-1,1,-1,-1,0,-1,-1,0,1],
// 0 4 16 -1 1 -1 -1 0 -1 1 0 -1 1 1 -1
// 4 16 1 1 -1 1 1 1 1 0 1 1 0 -1
  [4,16,1,1,-1,1,1,1,1,0,1,1,0,-1],
// 0
];
module ldraw_lib__box4t(step=0, col=false, unit=2/5, alt=false, line=0.2, solid=!$preview)
    makepoly(ldraw_lib__box4t(solid), step=step, col=col, unit=unit, alt=alt, line=line, solid=solid);
ldraw_lib__box4t(line=0.2);
// file: 3004.scad
use <../lib.scad>
use <s/3004s01.scad>
$fa=1; $fs=0.2;
function ldraw_lib__3004(realsolid=false) = [
// 0 Brick  1 x  2
// 0 Name: 3004.dat
// 0 Author: James Jessiman
// 0 !LDRAW_ORG Part UPDATE 2022-05
// 0 !LICENSE Licensed under CC BY 2.0 and CC BY 4.0 : see CAreadme.txt
// 
// 0 BFC CERTIFY CCW
  [0,"BFC","CERTIFY"],
  [0,"BFC","CCW"],
// 
// 0 !HISTORY 2001-10-26 [PTadmin] Official Update 2001-01
// 0 !HISTORY 2002-05-07 {unknown} BFC Certification
// 0 !HISTORY 2002-06-11 [PTadmin] Official Update 2002-03
// 0 !HISTORY 2007-05-07 [PTadmin] Header formatted for Contributor Agreement
// 0 !HISTORY 2008-07-01 [PTadmin] Official Update 2008-01
// 0 !HISTORY 2022-08-04 [MagFors] Using subfile
// 0 !HISTORY 2022-09-15 [PTadmin] Official Update 2022-05
// 
// 
// 1 16 0 0 0 1 0 0 0 1 0 0 0 1 s\3004s01.dat
  [1,16,0,0,0,1,0,0,0,1,0,0,0,1, ldraw_lib__s__3004s01(realsolid)],
// 4 16 -20 24 -10 20 24 -10 20 0 -10 -20 0 -10
  [4,16,-20,24,-10,20,24,-10,20,0,-10,-20,0,-10],
];
module ldraw_lib__3004(step=0, col=false, unit=2/5, alt=false, line=0.2, solid=!$preview)
    makepoly(ldraw_lib__3004(solid), step=step, col=col, unit=unit, alt=alt, line=line, solid=solid);
ldraw_lib__3004(line=0.2);
// file: s/3005s01.scad
use <../../lib.scad>
use <../../p/box4t.scad>
use <../../p/box5.scad>
use <../../p/stud.scad>
$fa=1; $fs=0.2;
function ldraw_lib__s__3005s01(realsolid=false) = [
// 0 ~Brick  1 x  1 without Front Face
// 0 Name: s\3005s01.dat
// 0 Author: John Riley [jriley]
// 0 !LDRAW_ORG Subpart UPDATE 2004-01
// 0 !LICENSE Licensed under CC BY 2.0 and CC BY 4.0 : see CAreadme.txt
// 
// 0 BFC CERTIFY CCW
  [0,"BFC","CERTIFY"],
  [0,"BFC","CCW"],
// 
// 0 !HISTORY 2003-09-07 [jriley] BFCed & Subfiled
// 0 !HISTORY 2004-03-02 [PTadmin] Official Update 2004-01
// 0 !HISTORY 2007-08-29 [PTadmin] Header formatted for Contributor Agreement
// 0 !HISTORY 2008-07-01 [PTadmin] Official Update 2008-01
// 
// 
// 0 BFC INVERTNEXT
  [0,"BFC","INVERTNEXT"],
// 1 16 0 24 0 0 0 6 0 -20 0 -6 0 0 box5.dat
  [1,16,0,24,0,0,0,6,0,-20,0,-6,0,0, ldraw_lib__box5(realsolid)],
// 4 16 10 24 -10 6 24 -6 6 24 6 10 24 10
  [4,16,10,24,-10,6,24,-6,6,24,6,10,24,10],
// 4 16 10 24 10 6 24 6 -6 24 6 -10 24 10
  [4,16,10,24,10,6,24,6,-6,24,6,-10,24,10],
// 4 16 -10 24 10 -6 24 6 -6 24 -6 -10 24 -10
  [4,16,-10,24,10,-6,24,6,-6,24,-6,-10,24,-10],
// 4 16 -10 24 -10 -6 24 -6 6 24 -6 10 24 -10
  [4,16,-10,24,-10,-6,24,-6,6,24,-6,10,24,-10],
// 1 16 0 24 0 10 0 0 0 -24 0 0 0 10 box4t.dat
  [1,16,0,24,0,10,0,0,0,-24,0,0,0,10, ldraw_lib__box4t(realsolid)],
// 1 16 0 0 0 0 0 1 0 1 0 -1 0 0 stud.dat
  [1,16,0,0,0,0,0,1,0,1,0,-1,0,0, ldraw_lib__stud(realsolid)],
// 0
];
module ldraw_lib__s__3005s01(step=0, col=false, unit=2/5, alt=false, line=0.2, solid=!$preview)
    makepoly(ldraw_lib__s__3005s01(solid), step=step, col=col, unit=unit, alt=alt, line=line, solid=solid);
ldraw_lib__s__3005s01(line=0.2);
// main file
use <../lib.scad>
use <s/3005pe2a.scad>
use <s/3005s01.scad>
$fa=1; $fs=0.2;
function ldraw_lib__3005pe3(realsolid=false) = [
// 0 Brick  1 x  1 with Angry Eye Right/Sad Eye Left Pattern
// 0 Name: 3005pe3.dat
// 0 Author: Andy Westrate [westrate]
// 0 !LDRAW_ORG Part UPDATE 2010-02
// 0 !LICENSE Licensed under CC BY 2.0 and CC BY 4.0 : see CAreadme.txt
// 
// 0 BFC CERTIFY CCW
  [0,"BFC","CERTIFY"],
  [0,"BFC","CCW"],
// 
// 0 !HISTORY 2010-07-05 [PTadmin] Official Update 2010-02
// 
// 
// 1 16 0 0 0 1 0 0 0 1 0 0 0 1 s\3005s01.dat
  [1,16,0,0,0,1,0,0,0,1,0,0,0,1, ldraw_lib__s__3005s01(realsolid)],
// 1 16 0 0 -10 -1 0 0 0 1 0 0 0 1 s\3005pe2a.dat
  [1,16,0,0,-10,-1,0,0,0,1,0,0,0,1, ldraw_lib__s__3005pe2a(realsolid)],
// 0
];
module ldraw_lib__3005pe3(step=0, col=false, unit=2/5, alt=false, line=0.2, solid=!$preview)
    makepoly(ldraw_lib__3005pe3(solid), step=step, col=col, unit=unit, alt=alt, line=line, solid=solid);
ldraw_lib__3005pe3(line=0.2);
